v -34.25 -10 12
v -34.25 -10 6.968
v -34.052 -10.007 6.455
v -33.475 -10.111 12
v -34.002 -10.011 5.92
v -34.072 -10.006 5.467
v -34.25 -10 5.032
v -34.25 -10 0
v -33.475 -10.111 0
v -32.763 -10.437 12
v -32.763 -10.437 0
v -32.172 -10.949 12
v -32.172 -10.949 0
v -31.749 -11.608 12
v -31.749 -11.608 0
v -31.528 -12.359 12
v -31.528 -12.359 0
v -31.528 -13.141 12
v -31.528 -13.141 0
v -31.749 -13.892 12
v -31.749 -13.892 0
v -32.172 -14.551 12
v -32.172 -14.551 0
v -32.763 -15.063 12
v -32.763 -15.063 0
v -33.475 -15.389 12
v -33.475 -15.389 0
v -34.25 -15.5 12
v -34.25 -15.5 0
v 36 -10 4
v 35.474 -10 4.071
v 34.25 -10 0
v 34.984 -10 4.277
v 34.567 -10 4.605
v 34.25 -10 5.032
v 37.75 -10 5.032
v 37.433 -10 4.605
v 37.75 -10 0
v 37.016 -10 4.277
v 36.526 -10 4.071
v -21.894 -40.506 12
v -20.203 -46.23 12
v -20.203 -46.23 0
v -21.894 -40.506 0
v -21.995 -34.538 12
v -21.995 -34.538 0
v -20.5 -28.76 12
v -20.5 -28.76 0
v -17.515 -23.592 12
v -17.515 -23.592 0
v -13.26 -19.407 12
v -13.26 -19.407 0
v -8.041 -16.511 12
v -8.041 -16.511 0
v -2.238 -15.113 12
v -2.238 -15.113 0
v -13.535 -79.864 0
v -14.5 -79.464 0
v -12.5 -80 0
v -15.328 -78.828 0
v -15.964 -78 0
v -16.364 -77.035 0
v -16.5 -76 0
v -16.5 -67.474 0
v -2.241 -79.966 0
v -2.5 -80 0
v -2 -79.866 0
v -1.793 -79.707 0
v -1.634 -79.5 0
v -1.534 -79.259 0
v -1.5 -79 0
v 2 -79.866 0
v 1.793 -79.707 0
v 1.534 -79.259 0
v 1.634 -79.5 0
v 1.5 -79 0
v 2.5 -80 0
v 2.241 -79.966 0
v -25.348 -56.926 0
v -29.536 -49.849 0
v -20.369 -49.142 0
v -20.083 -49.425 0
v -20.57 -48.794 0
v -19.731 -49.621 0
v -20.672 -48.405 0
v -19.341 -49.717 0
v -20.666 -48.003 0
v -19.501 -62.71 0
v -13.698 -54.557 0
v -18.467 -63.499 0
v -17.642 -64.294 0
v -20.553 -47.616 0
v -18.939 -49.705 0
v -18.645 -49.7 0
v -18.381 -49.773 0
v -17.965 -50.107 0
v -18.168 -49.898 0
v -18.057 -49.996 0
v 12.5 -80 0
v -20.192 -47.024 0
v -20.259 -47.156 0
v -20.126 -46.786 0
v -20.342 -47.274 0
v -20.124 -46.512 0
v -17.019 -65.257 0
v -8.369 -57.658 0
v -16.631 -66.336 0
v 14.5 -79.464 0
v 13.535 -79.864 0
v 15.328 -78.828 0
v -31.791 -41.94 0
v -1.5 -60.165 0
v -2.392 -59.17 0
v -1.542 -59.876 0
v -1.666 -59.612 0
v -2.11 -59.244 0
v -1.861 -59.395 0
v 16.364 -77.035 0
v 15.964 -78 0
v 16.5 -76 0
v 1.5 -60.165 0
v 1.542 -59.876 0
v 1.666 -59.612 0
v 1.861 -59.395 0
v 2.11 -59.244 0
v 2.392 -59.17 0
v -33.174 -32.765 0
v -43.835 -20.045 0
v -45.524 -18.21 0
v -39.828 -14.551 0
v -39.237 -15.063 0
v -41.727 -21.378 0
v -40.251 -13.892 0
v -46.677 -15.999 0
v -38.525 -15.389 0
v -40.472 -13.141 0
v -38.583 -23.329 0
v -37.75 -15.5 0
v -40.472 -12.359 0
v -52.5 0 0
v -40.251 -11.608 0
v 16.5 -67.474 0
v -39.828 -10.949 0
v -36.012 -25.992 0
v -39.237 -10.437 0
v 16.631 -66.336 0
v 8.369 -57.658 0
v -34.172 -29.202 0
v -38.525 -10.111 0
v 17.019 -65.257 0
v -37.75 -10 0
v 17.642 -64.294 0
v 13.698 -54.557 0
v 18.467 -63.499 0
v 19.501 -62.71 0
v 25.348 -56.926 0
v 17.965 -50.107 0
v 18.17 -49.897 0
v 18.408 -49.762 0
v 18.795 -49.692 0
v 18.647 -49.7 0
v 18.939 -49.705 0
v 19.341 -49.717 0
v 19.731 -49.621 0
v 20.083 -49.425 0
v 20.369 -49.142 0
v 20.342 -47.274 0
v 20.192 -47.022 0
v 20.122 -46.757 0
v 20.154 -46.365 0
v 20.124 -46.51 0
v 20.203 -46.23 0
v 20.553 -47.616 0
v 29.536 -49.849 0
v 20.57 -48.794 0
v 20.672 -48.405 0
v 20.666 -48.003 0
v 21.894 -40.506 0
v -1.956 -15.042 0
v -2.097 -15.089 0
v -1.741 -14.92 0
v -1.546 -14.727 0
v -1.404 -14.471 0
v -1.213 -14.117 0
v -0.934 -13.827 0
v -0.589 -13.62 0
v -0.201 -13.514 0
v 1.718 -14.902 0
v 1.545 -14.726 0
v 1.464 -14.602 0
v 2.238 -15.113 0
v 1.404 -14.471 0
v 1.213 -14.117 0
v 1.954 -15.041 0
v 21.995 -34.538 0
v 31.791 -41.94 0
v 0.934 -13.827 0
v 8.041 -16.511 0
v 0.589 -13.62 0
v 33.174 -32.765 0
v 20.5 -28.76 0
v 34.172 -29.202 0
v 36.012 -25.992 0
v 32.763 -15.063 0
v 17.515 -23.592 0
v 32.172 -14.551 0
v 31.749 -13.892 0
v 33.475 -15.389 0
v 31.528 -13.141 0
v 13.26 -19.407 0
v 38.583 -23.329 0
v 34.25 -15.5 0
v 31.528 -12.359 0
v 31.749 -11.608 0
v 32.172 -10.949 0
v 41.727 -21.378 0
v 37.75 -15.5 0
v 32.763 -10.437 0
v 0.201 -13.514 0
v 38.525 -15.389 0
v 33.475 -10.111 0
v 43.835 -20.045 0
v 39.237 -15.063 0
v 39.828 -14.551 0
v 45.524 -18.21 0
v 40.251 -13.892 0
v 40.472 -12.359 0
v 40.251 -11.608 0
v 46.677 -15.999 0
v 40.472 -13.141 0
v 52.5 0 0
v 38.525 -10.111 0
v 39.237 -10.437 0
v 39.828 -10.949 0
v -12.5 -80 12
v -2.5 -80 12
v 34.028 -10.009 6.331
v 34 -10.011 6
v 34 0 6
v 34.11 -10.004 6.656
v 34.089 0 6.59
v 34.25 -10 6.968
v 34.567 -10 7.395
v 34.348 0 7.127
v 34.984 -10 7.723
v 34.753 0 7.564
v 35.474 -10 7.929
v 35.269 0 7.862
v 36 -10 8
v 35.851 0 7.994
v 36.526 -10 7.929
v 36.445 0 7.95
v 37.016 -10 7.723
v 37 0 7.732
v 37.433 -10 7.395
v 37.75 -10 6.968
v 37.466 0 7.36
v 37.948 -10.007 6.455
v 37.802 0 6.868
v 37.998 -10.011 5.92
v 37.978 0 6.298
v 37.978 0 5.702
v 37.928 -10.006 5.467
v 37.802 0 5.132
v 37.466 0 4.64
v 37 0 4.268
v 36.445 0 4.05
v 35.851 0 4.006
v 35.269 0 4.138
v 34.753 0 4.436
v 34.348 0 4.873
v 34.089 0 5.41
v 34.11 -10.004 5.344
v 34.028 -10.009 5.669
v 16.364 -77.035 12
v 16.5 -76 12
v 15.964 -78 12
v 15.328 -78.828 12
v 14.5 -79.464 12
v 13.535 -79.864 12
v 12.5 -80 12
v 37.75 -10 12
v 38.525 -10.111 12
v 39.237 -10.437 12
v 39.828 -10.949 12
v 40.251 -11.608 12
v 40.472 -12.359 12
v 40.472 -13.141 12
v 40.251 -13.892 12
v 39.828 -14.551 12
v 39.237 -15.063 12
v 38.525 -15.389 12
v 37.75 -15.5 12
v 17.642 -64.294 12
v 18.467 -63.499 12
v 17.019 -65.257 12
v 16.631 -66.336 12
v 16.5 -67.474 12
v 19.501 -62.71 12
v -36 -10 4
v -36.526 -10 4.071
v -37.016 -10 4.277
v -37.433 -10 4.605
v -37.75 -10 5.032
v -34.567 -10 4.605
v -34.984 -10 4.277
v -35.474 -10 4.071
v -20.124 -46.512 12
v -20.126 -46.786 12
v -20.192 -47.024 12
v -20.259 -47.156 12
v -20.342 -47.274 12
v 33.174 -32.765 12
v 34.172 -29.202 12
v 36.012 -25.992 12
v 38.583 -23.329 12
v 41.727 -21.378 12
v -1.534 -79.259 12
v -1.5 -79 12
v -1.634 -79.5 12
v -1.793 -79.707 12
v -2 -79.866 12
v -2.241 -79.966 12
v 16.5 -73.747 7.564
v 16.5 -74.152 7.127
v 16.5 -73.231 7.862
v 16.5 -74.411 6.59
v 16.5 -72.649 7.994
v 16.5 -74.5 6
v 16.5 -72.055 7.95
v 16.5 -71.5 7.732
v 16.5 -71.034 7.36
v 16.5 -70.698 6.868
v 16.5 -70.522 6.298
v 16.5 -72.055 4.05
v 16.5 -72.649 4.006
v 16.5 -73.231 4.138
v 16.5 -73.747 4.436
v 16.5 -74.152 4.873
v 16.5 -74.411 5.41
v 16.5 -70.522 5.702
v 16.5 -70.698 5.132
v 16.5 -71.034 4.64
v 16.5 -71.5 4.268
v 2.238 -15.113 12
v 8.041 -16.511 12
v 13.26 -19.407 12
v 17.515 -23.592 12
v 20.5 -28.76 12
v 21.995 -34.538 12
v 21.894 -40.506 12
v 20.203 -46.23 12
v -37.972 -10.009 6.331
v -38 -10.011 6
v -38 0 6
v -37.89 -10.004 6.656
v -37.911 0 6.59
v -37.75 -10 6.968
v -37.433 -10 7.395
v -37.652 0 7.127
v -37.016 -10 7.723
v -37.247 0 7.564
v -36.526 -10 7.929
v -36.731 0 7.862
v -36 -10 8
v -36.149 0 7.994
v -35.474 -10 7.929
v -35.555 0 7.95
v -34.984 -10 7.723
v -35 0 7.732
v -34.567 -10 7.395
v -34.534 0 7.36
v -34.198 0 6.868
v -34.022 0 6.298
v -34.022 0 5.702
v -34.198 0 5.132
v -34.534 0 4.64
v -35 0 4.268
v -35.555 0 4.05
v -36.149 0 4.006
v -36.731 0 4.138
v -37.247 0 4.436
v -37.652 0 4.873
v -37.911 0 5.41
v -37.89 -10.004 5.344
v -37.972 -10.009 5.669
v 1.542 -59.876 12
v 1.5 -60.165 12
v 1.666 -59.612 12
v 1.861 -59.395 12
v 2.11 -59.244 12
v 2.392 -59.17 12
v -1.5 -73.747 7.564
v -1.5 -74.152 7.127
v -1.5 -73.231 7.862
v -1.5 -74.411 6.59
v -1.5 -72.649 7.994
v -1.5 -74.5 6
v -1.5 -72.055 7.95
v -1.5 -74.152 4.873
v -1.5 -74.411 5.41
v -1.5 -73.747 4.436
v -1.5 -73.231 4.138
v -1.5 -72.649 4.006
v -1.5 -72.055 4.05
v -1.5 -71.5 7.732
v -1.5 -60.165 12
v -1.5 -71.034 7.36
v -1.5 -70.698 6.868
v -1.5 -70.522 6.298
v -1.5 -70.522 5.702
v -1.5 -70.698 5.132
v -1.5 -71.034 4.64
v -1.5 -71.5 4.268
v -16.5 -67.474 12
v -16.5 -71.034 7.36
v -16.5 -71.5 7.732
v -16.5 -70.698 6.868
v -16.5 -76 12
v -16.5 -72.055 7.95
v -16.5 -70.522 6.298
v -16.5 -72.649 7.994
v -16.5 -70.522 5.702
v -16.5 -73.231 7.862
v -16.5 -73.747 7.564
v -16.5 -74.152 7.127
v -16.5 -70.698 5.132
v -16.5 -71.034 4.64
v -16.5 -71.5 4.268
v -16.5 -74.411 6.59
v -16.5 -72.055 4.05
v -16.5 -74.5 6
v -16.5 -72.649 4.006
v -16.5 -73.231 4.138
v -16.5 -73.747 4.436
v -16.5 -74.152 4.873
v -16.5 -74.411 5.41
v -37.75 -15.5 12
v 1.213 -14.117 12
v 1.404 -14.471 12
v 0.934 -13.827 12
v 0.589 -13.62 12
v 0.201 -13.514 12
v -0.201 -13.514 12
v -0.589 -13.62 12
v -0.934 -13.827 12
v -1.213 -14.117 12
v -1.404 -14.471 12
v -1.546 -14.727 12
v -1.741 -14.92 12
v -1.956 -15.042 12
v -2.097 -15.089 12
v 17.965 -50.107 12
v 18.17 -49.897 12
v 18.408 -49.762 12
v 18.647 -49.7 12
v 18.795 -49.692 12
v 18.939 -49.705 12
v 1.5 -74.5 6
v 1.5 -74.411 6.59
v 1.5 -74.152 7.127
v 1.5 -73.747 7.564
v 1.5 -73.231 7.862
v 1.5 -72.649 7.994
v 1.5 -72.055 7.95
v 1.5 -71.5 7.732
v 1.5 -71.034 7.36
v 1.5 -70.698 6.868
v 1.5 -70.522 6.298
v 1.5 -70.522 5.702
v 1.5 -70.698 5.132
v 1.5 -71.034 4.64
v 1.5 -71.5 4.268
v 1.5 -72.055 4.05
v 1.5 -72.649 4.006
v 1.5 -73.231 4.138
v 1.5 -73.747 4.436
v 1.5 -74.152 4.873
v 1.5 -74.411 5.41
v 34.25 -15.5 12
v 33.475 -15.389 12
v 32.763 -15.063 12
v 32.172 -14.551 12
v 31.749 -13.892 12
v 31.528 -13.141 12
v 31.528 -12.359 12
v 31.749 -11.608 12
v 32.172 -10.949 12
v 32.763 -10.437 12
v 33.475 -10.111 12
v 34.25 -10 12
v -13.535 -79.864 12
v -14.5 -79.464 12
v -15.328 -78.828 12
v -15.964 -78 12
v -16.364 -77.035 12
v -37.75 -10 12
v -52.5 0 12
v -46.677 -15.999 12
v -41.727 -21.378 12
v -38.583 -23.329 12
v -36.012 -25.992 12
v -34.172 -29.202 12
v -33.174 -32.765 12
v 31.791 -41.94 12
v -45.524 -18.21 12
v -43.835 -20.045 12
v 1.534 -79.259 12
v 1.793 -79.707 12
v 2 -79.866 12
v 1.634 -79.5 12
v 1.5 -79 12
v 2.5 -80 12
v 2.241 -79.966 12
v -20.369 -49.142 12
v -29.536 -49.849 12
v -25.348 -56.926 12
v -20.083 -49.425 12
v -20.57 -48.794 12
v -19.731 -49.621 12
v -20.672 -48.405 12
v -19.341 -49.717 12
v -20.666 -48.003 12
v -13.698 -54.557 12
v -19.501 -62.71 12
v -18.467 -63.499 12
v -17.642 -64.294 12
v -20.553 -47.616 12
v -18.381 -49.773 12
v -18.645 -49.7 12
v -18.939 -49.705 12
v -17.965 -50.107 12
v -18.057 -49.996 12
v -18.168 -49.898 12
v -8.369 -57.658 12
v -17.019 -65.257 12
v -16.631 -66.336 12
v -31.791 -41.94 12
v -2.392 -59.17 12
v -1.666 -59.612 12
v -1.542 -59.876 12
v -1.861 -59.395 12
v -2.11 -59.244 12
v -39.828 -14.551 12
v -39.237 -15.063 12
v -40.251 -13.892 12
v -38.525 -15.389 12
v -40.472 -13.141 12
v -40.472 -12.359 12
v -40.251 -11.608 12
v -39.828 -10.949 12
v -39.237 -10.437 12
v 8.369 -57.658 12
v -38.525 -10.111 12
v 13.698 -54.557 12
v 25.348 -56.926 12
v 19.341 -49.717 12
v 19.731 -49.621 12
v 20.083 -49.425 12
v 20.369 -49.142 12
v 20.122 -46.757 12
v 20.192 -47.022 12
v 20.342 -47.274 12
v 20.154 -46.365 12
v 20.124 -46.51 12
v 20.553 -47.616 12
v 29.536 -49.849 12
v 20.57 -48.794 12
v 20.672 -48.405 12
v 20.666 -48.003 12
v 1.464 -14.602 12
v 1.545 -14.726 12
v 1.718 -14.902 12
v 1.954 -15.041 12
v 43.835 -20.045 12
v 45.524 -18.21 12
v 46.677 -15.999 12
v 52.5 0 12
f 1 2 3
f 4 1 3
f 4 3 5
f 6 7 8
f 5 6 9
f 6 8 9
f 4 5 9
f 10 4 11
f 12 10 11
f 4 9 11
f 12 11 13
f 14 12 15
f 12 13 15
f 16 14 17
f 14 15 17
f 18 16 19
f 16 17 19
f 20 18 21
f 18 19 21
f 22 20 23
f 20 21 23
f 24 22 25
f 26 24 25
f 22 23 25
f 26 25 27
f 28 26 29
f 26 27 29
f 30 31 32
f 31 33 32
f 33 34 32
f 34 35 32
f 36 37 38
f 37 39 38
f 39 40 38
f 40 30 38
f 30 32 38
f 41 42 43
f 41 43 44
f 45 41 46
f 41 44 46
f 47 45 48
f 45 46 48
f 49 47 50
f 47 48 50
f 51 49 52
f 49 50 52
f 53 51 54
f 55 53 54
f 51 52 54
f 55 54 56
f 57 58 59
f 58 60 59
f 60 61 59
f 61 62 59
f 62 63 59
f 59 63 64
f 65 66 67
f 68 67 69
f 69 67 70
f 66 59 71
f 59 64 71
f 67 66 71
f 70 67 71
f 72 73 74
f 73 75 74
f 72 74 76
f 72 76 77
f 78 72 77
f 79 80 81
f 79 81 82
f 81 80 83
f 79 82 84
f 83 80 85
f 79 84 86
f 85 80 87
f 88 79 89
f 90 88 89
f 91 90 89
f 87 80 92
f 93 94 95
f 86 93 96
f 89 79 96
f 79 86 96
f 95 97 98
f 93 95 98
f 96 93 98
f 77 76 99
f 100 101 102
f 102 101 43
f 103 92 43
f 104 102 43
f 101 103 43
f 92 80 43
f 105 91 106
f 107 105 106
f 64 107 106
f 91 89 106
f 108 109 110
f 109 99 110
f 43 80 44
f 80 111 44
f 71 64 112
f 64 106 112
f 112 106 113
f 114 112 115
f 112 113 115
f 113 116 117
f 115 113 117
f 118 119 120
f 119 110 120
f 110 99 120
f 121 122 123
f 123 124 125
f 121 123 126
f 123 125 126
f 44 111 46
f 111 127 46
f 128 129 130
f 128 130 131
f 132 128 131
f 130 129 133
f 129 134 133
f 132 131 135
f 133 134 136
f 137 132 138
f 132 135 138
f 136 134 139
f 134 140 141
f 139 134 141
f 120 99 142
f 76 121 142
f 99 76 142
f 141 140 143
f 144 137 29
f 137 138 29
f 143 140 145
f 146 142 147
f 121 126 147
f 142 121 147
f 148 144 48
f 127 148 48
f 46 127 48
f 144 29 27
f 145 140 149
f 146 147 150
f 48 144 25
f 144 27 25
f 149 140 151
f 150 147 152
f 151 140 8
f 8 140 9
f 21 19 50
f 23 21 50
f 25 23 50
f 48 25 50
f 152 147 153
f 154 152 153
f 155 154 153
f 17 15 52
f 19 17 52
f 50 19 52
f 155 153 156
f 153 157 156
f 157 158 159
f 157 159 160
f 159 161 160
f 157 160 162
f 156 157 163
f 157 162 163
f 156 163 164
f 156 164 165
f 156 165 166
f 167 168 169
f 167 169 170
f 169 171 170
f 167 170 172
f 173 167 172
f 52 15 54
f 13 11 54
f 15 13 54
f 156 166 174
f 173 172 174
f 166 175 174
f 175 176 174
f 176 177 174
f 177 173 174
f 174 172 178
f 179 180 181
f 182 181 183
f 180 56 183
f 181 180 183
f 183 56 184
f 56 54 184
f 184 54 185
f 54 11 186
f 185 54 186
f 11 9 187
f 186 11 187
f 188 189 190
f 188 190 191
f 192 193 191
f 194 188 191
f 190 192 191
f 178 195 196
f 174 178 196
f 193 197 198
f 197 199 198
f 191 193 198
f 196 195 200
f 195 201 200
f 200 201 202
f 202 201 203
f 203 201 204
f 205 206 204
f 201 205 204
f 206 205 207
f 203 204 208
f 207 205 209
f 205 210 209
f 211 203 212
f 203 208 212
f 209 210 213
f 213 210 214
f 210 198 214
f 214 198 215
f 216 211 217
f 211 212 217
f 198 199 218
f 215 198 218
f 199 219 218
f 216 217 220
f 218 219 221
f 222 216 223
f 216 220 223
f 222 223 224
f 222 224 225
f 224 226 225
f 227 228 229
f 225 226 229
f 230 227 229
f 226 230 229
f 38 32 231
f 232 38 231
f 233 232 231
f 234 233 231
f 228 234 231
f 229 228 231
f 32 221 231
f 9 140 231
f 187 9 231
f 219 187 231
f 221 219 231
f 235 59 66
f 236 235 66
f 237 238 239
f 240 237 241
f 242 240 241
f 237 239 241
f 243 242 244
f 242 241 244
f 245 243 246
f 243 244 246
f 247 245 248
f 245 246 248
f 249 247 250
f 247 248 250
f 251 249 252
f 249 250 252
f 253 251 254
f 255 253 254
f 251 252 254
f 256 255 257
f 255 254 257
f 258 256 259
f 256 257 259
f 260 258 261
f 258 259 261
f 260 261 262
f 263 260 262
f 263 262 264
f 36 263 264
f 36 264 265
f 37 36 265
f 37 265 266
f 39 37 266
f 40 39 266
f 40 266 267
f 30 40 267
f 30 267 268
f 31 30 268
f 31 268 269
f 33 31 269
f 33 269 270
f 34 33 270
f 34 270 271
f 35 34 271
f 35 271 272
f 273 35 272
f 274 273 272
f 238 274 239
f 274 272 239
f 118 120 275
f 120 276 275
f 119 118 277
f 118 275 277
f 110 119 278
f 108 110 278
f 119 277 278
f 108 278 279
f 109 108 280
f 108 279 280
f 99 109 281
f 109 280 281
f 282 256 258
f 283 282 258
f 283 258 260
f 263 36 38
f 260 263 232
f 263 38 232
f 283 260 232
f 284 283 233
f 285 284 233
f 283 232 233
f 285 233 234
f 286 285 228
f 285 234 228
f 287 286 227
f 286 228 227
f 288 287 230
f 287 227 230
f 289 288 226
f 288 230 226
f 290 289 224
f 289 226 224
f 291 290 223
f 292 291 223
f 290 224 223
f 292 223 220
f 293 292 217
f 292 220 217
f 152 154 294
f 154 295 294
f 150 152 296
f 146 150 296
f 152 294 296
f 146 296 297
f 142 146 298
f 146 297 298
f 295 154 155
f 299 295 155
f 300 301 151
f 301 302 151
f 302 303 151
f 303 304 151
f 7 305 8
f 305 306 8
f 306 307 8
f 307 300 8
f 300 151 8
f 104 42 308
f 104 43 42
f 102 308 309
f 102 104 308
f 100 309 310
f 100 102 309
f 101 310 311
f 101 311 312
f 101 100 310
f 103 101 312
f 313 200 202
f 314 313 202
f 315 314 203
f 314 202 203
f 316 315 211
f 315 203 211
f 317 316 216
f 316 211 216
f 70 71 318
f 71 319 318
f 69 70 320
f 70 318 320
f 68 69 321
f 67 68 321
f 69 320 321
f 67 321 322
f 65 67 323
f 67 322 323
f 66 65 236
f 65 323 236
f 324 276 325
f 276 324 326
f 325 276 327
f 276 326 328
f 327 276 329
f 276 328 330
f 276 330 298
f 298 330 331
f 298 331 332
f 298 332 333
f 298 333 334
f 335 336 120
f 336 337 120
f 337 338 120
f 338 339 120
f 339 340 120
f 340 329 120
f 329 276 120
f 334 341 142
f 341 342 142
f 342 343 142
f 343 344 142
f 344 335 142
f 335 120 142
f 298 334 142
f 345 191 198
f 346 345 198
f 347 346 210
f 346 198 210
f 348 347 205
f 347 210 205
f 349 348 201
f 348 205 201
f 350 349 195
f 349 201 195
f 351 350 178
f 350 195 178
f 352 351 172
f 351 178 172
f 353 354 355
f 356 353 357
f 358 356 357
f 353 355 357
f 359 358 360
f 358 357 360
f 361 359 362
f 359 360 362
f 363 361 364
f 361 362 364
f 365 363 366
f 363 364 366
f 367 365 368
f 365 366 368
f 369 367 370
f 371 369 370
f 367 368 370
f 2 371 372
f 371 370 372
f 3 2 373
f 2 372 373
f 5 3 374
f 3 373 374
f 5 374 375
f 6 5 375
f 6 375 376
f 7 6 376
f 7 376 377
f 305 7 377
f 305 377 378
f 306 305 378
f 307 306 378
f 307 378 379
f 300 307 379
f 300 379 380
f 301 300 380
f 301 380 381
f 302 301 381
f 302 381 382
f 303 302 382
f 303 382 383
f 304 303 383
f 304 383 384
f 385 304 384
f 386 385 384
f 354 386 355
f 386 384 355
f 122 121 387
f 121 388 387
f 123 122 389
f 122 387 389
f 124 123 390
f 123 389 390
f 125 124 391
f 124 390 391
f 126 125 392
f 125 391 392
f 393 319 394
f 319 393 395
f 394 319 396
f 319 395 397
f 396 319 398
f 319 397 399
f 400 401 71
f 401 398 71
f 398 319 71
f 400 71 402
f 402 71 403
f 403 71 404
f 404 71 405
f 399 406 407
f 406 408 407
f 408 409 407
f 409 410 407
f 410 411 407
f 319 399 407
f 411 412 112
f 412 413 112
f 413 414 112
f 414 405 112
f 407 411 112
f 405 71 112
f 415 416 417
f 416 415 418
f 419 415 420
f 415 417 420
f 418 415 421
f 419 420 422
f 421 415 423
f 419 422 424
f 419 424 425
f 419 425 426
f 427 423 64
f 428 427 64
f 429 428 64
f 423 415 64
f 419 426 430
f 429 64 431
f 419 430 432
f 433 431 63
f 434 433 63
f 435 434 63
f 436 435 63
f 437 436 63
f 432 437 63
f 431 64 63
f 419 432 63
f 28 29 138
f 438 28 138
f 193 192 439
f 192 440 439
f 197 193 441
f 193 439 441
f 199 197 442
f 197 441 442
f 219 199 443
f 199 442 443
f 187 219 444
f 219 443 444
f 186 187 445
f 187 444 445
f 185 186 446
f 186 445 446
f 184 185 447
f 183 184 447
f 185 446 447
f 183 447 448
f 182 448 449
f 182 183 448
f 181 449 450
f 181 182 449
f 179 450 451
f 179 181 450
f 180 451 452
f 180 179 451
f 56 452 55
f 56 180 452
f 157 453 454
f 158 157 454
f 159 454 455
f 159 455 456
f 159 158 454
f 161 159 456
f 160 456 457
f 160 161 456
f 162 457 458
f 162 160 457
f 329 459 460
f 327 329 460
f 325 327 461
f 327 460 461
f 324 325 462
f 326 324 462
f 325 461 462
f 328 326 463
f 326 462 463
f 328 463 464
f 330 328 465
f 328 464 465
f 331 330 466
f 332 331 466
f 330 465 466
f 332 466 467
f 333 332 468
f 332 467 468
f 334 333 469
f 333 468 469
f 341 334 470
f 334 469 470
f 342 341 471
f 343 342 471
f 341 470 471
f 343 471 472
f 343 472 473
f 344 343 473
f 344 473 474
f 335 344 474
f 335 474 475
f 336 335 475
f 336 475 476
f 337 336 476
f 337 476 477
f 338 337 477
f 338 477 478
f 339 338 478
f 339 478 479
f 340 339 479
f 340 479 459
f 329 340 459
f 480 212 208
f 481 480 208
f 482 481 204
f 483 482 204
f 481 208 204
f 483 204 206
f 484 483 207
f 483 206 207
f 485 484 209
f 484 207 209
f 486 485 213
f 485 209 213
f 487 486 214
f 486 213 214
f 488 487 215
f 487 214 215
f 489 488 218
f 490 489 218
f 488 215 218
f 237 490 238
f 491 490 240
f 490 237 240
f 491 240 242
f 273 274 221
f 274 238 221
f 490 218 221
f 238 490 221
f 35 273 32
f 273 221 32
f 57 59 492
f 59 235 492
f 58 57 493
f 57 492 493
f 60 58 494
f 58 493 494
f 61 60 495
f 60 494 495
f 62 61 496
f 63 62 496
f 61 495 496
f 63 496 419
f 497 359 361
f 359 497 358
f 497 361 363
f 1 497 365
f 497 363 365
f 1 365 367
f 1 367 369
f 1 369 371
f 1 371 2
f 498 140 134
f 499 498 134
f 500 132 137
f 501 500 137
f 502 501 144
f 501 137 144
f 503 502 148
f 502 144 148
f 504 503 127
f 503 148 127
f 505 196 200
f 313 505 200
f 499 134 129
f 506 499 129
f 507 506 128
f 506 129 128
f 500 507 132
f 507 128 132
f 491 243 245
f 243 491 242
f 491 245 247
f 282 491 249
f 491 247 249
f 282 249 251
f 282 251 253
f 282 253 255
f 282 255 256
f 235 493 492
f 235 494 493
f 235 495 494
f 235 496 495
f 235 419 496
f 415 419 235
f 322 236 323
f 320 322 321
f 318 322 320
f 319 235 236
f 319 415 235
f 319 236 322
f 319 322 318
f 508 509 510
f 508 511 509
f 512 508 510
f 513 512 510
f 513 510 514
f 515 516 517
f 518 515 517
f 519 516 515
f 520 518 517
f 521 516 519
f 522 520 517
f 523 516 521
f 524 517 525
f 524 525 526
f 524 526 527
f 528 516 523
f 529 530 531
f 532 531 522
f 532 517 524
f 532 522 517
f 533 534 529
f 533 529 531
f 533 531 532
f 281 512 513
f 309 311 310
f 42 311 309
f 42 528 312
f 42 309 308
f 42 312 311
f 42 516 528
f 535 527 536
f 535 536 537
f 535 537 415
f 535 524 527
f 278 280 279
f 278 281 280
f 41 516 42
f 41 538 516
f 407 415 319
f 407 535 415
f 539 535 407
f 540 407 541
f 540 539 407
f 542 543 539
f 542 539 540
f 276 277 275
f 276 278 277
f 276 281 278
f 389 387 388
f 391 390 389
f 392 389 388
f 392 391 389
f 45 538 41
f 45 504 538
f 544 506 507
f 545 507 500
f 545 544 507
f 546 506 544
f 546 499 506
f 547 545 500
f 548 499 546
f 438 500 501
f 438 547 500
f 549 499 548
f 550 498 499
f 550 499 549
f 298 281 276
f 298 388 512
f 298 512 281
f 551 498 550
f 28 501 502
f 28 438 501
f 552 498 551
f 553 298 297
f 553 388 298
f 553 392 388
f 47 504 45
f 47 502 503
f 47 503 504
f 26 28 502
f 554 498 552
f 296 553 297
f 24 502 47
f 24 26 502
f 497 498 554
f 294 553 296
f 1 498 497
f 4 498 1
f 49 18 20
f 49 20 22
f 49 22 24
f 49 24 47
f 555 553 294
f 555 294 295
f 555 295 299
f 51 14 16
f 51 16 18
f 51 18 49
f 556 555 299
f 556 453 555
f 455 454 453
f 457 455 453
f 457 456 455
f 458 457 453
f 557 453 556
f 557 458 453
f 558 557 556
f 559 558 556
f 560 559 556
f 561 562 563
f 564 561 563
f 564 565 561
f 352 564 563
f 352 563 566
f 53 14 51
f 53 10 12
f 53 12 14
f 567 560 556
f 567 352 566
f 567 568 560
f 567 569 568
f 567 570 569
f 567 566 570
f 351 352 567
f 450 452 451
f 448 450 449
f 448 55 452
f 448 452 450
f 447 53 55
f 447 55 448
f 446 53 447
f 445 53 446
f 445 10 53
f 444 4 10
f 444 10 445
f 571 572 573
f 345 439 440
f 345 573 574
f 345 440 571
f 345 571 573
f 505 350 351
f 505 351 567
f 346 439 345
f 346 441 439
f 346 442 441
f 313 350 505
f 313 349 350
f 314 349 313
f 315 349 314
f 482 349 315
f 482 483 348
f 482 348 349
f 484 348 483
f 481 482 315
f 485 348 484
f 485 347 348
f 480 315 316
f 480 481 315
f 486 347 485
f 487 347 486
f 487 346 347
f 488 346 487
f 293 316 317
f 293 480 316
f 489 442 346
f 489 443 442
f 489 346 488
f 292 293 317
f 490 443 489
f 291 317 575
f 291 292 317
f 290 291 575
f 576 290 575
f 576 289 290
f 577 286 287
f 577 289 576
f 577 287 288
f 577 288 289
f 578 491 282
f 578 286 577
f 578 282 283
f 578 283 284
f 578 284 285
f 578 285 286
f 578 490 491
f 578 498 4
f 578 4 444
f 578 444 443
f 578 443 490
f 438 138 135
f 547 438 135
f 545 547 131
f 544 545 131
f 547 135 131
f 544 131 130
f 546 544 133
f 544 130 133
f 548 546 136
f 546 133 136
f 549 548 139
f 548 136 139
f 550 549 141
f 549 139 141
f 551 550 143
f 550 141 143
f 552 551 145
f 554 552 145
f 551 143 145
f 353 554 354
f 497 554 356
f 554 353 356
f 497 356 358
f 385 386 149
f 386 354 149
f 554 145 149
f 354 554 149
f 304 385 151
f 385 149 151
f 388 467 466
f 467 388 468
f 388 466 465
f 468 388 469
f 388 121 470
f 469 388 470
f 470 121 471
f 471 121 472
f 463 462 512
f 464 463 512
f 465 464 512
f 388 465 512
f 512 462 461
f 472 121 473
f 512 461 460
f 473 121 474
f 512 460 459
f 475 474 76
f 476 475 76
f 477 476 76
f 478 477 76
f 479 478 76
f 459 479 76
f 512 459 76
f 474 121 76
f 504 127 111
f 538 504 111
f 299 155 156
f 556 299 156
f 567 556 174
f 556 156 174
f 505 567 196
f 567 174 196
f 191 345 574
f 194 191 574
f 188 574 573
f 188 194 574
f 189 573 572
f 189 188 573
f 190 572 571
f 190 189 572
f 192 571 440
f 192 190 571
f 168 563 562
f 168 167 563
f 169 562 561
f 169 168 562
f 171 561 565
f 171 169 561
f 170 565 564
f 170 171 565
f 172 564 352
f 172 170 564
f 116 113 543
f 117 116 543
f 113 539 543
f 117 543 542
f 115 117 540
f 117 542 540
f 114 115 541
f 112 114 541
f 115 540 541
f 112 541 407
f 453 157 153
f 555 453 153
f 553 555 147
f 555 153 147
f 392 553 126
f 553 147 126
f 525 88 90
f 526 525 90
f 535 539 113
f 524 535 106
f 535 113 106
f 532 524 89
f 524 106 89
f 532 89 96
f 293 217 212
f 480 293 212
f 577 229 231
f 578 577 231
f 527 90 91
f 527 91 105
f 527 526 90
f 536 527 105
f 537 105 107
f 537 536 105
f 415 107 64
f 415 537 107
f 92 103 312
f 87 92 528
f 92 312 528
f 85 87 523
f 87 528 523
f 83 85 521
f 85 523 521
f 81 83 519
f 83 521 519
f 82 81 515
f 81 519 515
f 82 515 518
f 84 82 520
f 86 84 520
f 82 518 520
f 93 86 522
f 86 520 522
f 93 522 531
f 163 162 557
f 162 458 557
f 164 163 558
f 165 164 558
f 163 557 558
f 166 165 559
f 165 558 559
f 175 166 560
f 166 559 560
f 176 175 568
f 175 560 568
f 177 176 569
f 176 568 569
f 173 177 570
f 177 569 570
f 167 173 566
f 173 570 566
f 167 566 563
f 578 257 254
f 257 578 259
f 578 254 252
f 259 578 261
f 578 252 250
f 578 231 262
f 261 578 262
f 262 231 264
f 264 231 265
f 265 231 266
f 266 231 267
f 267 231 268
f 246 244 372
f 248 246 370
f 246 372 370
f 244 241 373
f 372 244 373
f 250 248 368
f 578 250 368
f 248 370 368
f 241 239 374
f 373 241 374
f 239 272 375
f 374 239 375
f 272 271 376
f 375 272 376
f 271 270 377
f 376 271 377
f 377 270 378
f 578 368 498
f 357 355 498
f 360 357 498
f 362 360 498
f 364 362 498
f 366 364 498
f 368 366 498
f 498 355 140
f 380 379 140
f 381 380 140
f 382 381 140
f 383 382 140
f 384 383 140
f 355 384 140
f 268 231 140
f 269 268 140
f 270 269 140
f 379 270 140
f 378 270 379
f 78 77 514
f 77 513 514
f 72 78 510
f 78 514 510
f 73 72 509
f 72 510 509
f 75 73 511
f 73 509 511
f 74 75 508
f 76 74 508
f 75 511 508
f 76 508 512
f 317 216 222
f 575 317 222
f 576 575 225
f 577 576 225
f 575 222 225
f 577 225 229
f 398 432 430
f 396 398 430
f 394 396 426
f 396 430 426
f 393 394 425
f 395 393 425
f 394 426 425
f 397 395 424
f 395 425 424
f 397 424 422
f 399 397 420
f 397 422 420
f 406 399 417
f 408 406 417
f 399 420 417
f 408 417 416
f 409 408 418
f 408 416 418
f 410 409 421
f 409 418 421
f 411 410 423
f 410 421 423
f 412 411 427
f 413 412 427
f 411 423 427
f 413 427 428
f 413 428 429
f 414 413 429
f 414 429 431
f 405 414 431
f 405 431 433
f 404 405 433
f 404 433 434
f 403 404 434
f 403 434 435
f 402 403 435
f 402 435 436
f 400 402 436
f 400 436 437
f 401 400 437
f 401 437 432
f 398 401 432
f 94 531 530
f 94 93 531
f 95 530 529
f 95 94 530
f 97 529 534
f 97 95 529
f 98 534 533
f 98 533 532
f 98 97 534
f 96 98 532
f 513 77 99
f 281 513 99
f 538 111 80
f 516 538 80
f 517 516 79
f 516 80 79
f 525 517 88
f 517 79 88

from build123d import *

# Parameters (mm, degrees)
F1_DEPTH = 12
F2_R     = 5
F3_R     = 2
F4_DEPTH = 69.001
F5_R     = 4
F6_R     = 2
F7_DEPTH = 12
F8_R     = 1.5
F9_DEPTH = 25
F10_R    = 1


with BuildPart() as f1:
    # F0 (on Top) → F1 (new body)
    with BuildSketch(Plane.XY):
        with BuildLine():
            Line((52.5, 0), (-52.5, 0))
            Line((-52.5, 0), (-46.6771353676, -15.9990389547))
            ThreePointArc((-46.6771353676, -15.9990389547), (-44.7400164437, -19.1834804046), (-41.7268534535, -21.3775510204))
            ThreePointArc((-41.7268534535, -21.3775510204), (-36.0124674438, -25.9915106654), (-33.1735048367, -32.7652188367))
            Line((-33.1735048367, -32.7652188367), (-31.7911865206, -41.93988096))
            ThreePointArc((-31.7911865206, -41.93988096), (-27.6690936208, -53.5220419681), (-19.5011770908, -62.7102541473))
            Line((-19.5011770908, -62.7102541473), (-16.5, -65))
            Line((-16.5, -65), (-16.5, -80))
            Line((-16.5, -80), (-1.5, -80))
            Line((-1.5, -80), (-1.5, -59.2491515674))
            ThreePointArc((-1.5, -59.2491515674), (0, -15), (1.5, -59.2491515674))
            Line((1.5, -59.2491515674), (1.5, -80))
            Line((1.5, -80), (16.5, -80))
            Line((16.5, -80), (16.5, -65))
            Line((16.5, -65), (19.5011770908, -62.7102541473))
            ThreePointArc((19.5011770908, -62.7102541473), (27.6690936208, -53.5220419681), (31.7911865206, -41.93988096))
            Line((31.7911865206, -41.93988096), (33.1735048367, -32.7652188367))
            ThreePointArc((33.1735048367, -32.7652188367), (36.0124674438, -25.9915106654), (41.7268534535, -21.3775510204))
            ThreePointArc((41.7268534535, -21.3775510204), (44.7400164437, -19.1834804046), (46.6771353676, -15.9990389547))
            Line((46.6771353676, -15.9990389547), (52.5, 0))
        make_face()
        with BuildLine():
            Line((-34.25, -15.5), (-37.75, -15.5))
            ThreePointArc((-37.75, -15.5), (-40.5, -12.75), (-37.75, -10))
            Line((-37.75, -10), (-34.25, -10))
            ThreePointArc((-34.25, -10), (-31.5, -12.75), (-34.25, -15.5))
        make_face(mode=Mode.SUBTRACT)
        with BuildLine():
            ThreePointArc((37.75, -10), (40.5, -12.75), (37.75, -15.5))
            Line((37.75, -15.5), (34.25, -15.5))
            ThreePointArc((34.25, -15.5), (31.5, -12.75), (34.25, -10))
            Line((34.25, -10), (37.75, -10))
        make_face(mode=Mode.SUBTRACT)
    extrude(amount=F1_DEPTH)

    # F2
    f2_edges = [f1.edges().sort_by_distance(p)[0] for p in [
        (-16.5, -65, 6),
        (16.5, -65, 6),
    ]]
    fillet(f2_edges, radius=F2_R)

    # F3 (on face) → F4 (cut, through all)
    with BuildSketch(Plane(origin=(-16.5, 0, 0), x_dir=(0, -1, 0), z_dir=(-1, 0, 0))):
        with Locations((72.5, 6)):
            Circle(F3_R)
    extrude(amount=-F4_DEPTH, mode=Mode.SUBTRACT)

    # F5
    f5_edges = [f1.edges().sort_by_distance(p)[0] for p in [
        (-16.5, -80, 6),
        (16.5, -80, 6),
    ]]
    fillet(f5_edges, radius=F5_R)

    # F6 (on face) → F7 (cut)
    with BuildSketch(Plane(origin=(0, 0, 0), x_dir=(-1, 0, 0), z_dir=(0, 1, 0))):
        with Locations((-36, 6)):
            Circle(F6_R)
        with Locations((36, 6)):
            Circle(F6_R)
    extrude(amount=-F7_DEPTH, mode=Mode.SUBTRACT)

    # F8 (on face) → F9 (cut)
    with BuildSketch(Plane.XY.offset(12)):
        with Locations((0, -15)):
            Circle(F8_R)
        with Locations((-19.1824626938, -48.225)):
            Circle(F8_R)
        with Locations((19.1824626938, -48.225)):
            Circle(F8_R)
    extrude(amount=-F9_DEPTH, mode=Mode.SUBTRACT)

    # F10
    f10_edges = [f1.edges().sort_by_distance(p)[0] for p in [
        (1.49914, -15.05079, 6),
        (-1.49914, -15.05079, 6),
        (-19.888047, -46.901312, 6),
        (-18.388907, -49.497898, 6),
        (18.388907, -49.497898, 6),
        (19.888047, -46.901312, 6),
        (1.5, -59.249152, 6),
        (-1.5, -59.249152, 6),
        (1.5, -80, 6),
        (-1.5, -80, 6),
    ]]
    fillet(f10_edges, radius=F10_R)


solid = f1.part
